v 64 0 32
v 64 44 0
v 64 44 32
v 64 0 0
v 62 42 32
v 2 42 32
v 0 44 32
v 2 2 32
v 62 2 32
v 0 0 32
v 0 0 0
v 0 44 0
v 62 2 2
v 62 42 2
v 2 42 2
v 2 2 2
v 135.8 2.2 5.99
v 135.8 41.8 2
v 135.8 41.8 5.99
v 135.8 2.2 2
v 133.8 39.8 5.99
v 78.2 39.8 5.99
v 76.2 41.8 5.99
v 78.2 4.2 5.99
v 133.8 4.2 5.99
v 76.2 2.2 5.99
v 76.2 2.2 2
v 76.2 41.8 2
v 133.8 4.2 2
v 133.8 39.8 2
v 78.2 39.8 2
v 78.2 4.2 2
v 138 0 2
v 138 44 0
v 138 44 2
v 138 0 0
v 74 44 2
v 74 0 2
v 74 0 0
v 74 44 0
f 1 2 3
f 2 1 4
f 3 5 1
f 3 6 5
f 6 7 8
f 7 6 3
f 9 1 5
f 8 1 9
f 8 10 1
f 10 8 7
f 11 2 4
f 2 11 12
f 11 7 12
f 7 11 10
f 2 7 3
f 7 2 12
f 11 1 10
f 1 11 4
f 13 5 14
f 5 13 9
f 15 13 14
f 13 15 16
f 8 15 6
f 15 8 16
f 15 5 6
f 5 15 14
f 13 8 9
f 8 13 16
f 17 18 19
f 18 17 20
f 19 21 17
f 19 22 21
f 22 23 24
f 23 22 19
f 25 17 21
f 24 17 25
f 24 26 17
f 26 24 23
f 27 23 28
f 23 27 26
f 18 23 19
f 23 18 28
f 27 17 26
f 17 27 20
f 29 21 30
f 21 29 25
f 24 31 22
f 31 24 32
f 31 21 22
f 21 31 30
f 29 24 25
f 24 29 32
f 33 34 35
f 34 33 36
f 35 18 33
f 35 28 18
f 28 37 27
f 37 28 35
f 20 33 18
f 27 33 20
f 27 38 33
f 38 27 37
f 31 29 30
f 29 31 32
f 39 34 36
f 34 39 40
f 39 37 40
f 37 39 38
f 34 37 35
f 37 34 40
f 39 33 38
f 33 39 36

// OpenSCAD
// Box with lid
// An open box and a lid with an insert lip, printed side by side.

/* [Box] */
// Inside width (mm)
inner_width = 60; // [20:1:200]
// Inside depth (mm)
inner_depth = 40; // [20:1:200]
// Inside height (mm)
inner_height = 30; // [10:1:150]
// Wall thickness (mm)
wall = 2; // [1.2:0.2:5]

/* [Lid] */
// Height of the lip that sits inside the box (mm)
lip_height = 4; // [2:0.5:10]
// Gap between the lip and the box wall (mm)
clearance = 0.2; // [0:0.05:0.6]

/* [Hidden] */
gap = 10;
outer_width = inner_width + 2 * wall;
outer_depth = inner_depth + 2 * wall;

module box() {
  difference() {
    cube([outer_width, outer_depth, inner_height + wall]);
    translate([wall, wall, wall])
      cube([inner_width, inner_depth, inner_height + 1]);
  }
}

module lid() {
  lip_width = inner_width - 2 * clearance;
  lip_depth = inner_depth - 2 * clearance;
  cube([outer_width, outer_depth, wall]);
  translate([wall + clearance, wall + clearance, wall - 0.01])
    difference() {
      cube([lip_width, lip_depth, lip_height]);
      translate([wall, wall, -1])
        cube([lip_width - 2 * wall, lip_depth - 2 * wall, lip_height + 2]);
    }
}

box();
translate([outer_width + gap, 0, 0]) lid();
